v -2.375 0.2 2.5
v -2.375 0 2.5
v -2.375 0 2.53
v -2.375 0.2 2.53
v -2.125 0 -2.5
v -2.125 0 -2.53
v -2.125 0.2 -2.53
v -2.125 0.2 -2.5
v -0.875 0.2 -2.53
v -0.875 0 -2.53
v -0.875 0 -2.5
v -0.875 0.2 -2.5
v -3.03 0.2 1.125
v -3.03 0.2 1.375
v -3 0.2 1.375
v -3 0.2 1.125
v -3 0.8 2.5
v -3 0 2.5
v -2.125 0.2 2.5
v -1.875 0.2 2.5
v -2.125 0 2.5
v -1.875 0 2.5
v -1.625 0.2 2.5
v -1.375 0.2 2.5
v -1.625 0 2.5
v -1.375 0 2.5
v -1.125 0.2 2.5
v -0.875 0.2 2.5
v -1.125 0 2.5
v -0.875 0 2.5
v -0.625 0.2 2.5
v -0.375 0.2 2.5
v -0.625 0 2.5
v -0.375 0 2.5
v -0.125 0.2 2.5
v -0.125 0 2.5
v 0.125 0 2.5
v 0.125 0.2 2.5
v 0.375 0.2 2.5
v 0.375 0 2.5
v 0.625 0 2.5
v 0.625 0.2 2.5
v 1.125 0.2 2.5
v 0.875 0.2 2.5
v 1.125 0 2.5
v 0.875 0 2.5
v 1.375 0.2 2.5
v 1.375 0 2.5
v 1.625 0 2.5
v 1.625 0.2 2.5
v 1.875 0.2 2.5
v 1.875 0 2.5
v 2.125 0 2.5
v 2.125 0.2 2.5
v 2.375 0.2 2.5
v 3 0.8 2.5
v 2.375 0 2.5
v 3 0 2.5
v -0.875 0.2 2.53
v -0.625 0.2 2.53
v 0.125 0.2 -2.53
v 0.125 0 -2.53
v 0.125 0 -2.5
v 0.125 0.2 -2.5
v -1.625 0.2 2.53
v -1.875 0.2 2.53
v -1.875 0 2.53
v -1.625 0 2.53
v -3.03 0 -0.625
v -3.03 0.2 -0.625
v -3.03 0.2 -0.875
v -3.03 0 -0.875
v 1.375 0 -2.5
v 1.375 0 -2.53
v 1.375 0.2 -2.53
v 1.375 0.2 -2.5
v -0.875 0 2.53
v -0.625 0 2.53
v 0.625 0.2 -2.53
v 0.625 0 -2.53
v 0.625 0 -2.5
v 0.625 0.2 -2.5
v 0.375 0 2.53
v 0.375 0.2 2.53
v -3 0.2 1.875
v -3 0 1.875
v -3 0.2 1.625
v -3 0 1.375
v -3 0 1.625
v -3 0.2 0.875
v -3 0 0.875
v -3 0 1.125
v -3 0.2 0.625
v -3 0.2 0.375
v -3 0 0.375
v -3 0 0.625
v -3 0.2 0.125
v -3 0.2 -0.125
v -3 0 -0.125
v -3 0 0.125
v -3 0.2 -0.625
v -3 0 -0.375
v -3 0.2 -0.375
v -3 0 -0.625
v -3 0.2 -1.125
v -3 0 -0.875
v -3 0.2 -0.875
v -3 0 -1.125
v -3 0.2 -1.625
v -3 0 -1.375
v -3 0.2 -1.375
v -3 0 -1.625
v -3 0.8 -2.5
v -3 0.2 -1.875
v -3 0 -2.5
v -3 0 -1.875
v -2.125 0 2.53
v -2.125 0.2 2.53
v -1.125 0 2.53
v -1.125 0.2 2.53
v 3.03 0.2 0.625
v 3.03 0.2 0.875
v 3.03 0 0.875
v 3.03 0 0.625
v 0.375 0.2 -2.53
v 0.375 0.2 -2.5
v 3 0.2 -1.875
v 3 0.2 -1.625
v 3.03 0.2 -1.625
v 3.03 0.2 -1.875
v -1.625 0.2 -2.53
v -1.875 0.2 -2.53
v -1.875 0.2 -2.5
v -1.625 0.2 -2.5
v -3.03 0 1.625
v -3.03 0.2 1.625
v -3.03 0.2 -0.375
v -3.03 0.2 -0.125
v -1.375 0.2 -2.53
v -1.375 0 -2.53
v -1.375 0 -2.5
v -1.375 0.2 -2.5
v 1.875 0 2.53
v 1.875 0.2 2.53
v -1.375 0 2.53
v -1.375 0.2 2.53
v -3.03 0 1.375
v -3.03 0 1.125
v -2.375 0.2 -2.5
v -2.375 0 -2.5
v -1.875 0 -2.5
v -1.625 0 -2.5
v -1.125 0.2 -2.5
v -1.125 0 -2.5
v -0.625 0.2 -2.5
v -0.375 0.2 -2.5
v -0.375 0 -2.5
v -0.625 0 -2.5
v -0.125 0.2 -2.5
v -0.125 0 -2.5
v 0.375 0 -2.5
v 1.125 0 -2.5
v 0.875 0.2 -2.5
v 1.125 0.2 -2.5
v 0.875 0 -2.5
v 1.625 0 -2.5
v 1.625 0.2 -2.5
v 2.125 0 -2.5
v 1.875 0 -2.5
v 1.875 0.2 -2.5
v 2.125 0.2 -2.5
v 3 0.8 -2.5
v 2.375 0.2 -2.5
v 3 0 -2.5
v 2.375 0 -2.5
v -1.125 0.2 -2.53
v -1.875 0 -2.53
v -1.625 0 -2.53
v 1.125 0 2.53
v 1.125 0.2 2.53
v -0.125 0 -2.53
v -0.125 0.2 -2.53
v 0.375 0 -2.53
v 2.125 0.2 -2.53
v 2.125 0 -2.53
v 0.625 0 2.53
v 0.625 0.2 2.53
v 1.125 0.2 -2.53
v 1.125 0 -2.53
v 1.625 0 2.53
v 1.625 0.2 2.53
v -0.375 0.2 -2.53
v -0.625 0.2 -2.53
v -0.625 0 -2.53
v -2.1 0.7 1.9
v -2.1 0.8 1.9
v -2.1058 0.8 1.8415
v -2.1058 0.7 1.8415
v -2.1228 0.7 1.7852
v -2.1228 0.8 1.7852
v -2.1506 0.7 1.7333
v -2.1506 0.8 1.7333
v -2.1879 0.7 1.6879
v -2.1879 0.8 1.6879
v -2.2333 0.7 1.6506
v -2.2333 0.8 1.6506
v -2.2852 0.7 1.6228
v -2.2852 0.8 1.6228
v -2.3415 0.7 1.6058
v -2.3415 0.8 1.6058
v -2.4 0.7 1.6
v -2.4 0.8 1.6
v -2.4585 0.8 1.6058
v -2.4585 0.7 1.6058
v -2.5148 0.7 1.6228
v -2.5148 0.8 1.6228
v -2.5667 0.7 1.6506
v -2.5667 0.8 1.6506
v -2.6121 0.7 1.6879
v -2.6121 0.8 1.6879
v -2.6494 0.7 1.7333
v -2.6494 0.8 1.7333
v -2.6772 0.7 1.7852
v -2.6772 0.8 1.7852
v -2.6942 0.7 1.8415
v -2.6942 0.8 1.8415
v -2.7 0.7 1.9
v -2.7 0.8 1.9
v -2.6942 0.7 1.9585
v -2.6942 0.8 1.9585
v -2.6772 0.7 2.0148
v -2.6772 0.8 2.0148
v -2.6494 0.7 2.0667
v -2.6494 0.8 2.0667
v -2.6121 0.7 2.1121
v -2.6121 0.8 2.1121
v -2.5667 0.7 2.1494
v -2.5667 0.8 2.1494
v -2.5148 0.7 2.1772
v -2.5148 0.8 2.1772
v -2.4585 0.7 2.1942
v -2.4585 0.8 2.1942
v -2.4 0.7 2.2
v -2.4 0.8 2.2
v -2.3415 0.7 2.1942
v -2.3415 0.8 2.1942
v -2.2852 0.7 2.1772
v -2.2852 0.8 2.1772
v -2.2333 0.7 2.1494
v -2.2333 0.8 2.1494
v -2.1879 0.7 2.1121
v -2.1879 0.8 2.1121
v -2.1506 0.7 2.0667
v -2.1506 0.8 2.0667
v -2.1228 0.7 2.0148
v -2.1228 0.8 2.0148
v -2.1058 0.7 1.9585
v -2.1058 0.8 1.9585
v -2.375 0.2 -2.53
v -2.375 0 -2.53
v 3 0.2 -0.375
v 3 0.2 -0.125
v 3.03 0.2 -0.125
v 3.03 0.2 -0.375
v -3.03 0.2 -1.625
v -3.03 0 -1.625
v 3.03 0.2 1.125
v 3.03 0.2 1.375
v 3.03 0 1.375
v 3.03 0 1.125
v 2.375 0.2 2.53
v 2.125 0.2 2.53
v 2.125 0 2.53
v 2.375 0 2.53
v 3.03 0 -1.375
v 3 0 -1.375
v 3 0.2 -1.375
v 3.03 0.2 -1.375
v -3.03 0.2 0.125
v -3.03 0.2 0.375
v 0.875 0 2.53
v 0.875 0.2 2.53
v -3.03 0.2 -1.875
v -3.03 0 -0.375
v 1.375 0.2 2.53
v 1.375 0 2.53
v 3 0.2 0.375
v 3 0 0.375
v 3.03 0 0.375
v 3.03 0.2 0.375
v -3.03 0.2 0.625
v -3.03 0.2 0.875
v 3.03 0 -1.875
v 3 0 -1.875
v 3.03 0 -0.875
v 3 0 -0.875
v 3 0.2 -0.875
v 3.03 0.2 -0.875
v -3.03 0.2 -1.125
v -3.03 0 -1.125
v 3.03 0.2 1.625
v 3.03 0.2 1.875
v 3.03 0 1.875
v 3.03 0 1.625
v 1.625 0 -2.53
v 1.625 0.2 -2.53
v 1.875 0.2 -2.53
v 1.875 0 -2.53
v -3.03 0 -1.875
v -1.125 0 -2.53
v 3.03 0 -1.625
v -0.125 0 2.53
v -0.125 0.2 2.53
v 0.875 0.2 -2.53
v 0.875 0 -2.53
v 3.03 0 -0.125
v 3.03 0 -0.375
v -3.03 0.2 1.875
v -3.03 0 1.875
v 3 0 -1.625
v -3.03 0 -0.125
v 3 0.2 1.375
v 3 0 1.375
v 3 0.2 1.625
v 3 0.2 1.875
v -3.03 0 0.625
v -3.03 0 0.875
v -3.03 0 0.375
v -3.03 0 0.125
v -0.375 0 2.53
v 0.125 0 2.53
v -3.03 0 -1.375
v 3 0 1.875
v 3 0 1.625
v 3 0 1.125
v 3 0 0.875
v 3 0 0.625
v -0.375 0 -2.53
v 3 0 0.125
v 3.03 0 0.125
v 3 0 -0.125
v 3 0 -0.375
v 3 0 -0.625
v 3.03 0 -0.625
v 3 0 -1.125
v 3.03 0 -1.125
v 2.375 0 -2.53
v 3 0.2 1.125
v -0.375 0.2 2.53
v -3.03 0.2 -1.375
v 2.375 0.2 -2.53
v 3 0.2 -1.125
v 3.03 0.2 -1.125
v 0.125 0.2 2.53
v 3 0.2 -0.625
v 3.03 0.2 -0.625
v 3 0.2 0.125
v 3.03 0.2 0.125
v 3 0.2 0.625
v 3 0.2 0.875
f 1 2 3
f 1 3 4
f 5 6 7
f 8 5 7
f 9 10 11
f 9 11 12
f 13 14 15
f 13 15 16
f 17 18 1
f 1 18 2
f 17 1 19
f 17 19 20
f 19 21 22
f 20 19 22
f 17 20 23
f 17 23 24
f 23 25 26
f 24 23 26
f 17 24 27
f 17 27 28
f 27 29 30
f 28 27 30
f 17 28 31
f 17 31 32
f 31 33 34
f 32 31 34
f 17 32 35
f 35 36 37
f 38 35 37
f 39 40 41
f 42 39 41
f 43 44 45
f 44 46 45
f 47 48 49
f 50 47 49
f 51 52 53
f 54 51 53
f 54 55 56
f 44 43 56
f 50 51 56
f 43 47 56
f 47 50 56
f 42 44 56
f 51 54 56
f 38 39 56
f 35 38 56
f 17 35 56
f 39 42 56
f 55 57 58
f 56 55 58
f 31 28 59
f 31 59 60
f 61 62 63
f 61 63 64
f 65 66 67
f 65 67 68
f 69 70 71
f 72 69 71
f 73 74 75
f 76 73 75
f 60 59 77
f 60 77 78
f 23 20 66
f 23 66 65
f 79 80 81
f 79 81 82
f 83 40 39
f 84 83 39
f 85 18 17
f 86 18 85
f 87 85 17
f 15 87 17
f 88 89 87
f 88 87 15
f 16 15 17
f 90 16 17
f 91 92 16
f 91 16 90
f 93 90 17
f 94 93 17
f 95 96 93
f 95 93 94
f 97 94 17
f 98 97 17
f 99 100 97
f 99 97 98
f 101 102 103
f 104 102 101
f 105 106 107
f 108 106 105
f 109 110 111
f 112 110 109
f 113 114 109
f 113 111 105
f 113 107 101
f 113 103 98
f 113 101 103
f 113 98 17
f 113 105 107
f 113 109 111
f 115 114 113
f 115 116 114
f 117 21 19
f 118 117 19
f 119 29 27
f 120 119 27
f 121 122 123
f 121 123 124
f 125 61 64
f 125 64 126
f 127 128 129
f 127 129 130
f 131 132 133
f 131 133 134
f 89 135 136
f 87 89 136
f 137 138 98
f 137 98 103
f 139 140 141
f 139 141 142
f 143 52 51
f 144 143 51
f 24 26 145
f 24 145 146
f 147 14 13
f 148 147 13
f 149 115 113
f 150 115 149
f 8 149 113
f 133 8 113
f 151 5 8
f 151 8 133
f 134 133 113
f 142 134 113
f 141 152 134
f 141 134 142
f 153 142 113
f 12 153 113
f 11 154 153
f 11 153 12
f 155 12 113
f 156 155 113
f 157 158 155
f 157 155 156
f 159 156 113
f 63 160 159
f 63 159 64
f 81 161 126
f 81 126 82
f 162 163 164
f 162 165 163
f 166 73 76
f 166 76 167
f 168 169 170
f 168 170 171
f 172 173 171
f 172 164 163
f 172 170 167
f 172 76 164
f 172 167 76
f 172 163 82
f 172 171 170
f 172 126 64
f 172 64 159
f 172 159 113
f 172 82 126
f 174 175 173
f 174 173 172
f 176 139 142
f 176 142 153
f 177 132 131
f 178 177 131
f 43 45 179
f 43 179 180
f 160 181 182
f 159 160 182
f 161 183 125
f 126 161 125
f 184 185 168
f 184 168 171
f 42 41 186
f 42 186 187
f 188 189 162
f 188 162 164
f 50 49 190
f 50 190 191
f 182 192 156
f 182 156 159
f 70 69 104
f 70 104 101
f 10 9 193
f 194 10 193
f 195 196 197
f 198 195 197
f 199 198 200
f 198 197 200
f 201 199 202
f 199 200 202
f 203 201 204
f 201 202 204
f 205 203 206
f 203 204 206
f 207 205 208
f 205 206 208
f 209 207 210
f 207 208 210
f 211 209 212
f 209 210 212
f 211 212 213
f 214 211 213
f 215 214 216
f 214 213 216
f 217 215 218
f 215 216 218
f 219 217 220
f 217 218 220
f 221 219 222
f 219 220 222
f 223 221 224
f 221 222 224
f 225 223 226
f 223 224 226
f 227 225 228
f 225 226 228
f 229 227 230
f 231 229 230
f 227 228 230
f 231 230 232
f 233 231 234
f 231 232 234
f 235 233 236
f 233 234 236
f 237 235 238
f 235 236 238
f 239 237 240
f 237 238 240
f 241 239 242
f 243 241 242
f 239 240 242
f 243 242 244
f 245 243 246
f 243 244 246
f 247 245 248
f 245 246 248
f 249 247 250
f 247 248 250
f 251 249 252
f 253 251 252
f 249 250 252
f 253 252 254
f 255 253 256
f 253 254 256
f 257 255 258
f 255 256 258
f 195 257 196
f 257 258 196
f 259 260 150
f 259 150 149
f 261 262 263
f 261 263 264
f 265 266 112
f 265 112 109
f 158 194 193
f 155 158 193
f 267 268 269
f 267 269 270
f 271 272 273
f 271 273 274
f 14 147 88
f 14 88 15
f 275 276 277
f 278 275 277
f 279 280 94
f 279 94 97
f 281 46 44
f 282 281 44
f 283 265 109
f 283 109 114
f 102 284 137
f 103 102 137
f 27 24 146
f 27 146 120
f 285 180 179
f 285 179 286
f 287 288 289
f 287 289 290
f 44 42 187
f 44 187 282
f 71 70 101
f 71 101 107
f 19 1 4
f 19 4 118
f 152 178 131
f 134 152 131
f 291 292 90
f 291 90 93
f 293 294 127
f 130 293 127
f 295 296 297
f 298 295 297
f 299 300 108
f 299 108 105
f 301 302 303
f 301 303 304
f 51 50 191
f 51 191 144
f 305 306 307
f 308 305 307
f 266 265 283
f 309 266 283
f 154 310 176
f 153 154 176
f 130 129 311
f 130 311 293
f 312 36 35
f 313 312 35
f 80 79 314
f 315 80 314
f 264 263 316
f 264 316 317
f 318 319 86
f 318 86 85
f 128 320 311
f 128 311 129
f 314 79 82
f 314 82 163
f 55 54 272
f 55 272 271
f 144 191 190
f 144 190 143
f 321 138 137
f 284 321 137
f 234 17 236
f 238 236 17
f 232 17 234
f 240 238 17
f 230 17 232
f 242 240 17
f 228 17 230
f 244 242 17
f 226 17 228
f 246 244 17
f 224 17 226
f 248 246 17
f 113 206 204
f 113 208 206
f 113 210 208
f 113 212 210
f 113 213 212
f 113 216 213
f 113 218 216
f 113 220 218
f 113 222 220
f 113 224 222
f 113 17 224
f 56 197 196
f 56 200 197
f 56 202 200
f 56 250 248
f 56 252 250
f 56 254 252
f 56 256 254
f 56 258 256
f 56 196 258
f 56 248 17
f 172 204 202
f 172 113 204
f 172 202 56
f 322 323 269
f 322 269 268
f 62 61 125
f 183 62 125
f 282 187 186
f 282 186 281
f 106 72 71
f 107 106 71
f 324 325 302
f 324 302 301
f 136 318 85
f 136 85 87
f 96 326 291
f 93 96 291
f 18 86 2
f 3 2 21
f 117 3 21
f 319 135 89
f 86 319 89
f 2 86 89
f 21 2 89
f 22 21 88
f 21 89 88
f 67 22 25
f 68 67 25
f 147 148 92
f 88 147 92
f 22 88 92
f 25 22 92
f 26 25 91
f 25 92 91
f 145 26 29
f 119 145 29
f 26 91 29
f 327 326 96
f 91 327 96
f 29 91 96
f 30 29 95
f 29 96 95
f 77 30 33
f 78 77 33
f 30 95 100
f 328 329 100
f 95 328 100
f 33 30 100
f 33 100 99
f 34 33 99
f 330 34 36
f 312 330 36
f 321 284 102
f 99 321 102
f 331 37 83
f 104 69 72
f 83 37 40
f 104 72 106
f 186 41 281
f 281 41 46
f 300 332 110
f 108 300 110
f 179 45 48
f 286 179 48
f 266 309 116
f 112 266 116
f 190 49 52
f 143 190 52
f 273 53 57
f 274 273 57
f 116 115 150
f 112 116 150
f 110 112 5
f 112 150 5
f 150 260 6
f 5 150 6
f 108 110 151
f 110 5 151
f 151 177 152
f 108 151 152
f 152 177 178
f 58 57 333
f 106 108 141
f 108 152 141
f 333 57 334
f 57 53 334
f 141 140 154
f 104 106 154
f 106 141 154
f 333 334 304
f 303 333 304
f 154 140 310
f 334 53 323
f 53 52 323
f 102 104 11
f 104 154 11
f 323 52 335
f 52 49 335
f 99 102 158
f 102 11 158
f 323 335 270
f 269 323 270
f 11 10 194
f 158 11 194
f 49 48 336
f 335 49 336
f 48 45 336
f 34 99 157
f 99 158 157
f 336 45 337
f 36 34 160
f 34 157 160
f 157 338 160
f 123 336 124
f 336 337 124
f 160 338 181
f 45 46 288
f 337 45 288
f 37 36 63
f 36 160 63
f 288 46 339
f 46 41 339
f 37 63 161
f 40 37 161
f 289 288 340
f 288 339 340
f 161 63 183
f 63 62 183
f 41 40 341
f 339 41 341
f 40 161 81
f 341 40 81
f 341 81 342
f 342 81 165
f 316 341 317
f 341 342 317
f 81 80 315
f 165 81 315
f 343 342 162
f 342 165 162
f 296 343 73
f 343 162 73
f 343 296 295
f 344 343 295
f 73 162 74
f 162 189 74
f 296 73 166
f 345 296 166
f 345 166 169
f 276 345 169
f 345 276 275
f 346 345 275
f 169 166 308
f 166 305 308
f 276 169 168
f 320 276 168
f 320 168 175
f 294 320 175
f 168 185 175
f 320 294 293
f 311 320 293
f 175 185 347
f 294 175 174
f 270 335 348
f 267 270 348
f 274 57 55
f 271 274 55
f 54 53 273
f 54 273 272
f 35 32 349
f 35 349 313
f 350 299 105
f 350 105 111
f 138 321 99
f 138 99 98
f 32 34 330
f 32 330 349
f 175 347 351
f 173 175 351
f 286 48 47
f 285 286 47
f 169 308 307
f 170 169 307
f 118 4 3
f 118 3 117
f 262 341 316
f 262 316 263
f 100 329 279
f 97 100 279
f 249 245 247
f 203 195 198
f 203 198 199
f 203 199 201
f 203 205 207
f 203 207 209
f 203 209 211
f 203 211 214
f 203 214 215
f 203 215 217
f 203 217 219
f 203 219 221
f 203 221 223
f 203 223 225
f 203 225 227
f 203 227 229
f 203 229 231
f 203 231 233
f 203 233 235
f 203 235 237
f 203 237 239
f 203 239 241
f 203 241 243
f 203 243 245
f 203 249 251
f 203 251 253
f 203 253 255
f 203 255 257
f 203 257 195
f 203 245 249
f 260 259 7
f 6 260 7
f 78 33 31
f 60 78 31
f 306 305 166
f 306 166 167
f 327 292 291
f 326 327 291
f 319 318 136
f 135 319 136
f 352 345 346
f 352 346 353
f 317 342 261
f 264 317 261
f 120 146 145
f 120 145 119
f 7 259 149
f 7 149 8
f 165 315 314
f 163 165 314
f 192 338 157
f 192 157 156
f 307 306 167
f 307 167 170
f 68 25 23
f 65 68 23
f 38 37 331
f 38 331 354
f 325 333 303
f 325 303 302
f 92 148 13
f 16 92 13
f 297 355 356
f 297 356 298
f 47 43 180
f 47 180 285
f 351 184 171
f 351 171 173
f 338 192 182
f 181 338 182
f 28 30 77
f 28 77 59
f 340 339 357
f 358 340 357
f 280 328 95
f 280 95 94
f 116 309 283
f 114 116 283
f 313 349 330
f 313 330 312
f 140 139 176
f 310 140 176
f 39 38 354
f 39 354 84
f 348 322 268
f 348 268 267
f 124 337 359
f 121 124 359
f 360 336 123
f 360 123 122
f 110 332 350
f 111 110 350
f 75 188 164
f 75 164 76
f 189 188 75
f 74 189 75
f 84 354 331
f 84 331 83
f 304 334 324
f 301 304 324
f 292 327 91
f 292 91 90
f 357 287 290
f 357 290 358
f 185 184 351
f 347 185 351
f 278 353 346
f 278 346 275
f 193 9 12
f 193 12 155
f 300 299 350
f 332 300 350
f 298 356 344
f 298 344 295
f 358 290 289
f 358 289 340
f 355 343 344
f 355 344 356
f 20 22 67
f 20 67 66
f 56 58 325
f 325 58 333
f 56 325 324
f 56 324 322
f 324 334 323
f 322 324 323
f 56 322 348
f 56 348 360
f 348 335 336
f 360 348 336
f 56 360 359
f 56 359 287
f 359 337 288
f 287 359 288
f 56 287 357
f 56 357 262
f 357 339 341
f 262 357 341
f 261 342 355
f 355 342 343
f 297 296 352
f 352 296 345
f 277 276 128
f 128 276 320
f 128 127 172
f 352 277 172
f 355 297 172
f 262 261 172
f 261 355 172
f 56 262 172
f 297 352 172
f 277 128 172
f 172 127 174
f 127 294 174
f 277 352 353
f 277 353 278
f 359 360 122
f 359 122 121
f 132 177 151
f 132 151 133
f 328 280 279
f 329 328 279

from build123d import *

# Parameters (mm, degrees)
SKETCH1_W           = 6
SKETCH1_H           = 5
BOSS_EXTRUDE1_DEPTH = 0.8
SKETCH2_R           = 0.3
CUT_EXTRUDE1_DEPTH  = 0.1
SKETCH3_W           = 0.25
SKETCH3_H           = 0.2
BOSS_EXTRUDE2_DEPTH = 0.03
LPATTERN1_COUNT     = 2
LPATTERN1_PITCH     = 5.03
SKETCH4_W           = 0.25
SKETCH4_H           = 0.2
BOSS_EXTRUDE3_DEPTH = 0.03
LPATTERN2_COUNT     = 2
LPATTERN2_PITCH     = 6.03


with BuildPart() as part:
    # Sketch1 → Boss-Extrude1 (new body)
    with BuildSketch(Plane(origin=(0, 0, 0), x_dir=(1, 0, 0), z_dir=(0, 1, 0))):
        Rectangle(SKETCH1_W, SKETCH1_H)
    extrude(amount=BOSS_EXTRUDE1_DEPTH)

    # Sketch2 → Cut-Extrude1 (cut)
    with BuildSketch(Plane(origin=(0, 0.8, 0), x_dir=(1, 0, 0), z_dir=(0, 1, 0))):
        with Locations((-2.4, -1.9)):
            Circle(SKETCH2_R)
    extrude(amount=-CUT_EXTRUDE1_DEPTH, mode=Mode.SUBTRACT)

    # Sketch3 → Boss-Extrude2 (add)
    with BuildSketch(Plane.XY.offset(2.5)):
        with Locations((-0.25, 0.1)):
            Rectangle(SKETCH3_W, SKETCH3_H)
        with Locations((0.25, 0.1)):
            Rectangle(SKETCH3_W, SKETCH3_H)
        with Locations((0.75, 0.1)):
            Rectangle(SKETCH3_W, SKETCH3_H)
        with Locations((1.25, 0.1)):
            Rectangle(SKETCH3_W, SKETCH3_H)
        with Locations((1.75, 0.1)):
            Rectangle(SKETCH3_W, SKETCH3_H)
        with Locations((2.25, 0.1)):
            Rectangle(SKETCH3_W, SKETCH3_H)
        with Locations((-0.75, 0.1)):
            Rectangle(SKETCH3_W, SKETCH3_H)
        with Locations((-1.25, 0.1)):
            Rectangle(SKETCH3_W, SKETCH3_H)
        with Locations((-1.75, 0.1)):
            Rectangle(SKETCH3_W, SKETCH3_H)
        with Locations((-2.25, 0.1)):
            Rectangle(SKETCH3_W, SKETCH3_H)
    boss_extrude2 = extrude(amount=BOSS_EXTRUDE2_DEPTH)

    # LPattern1: Boss-Extrude2 ×2
    with Locations(*[(0, 0, -i * LPATTERN1_PITCH) for i in range(1, LPATTERN1_COUNT)]):
        add(boss_extrude2)

    # Sketch4 → Boss-Extrude3 (add)
    with BuildSketch(Plane(origin=(3, 0, 0), x_dir=(0, 0, -1), z_dir=(1, 0, 0))):
        with Locations((-0.25, 0.1)):
            Rectangle(SKETCH4_W, SKETCH4_H)
        with Locations((0.25, 0.1)):
            Rectangle(SKETCH4_W, SKETCH4_H)
        with Locations((0.75, 0.1)):
            Rectangle(SKETCH4_W, SKETCH4_H)
        with Locations((1.25, 0.1)):
            Rectangle(SKETCH4_W, SKETCH4_H)
        with Locations((1.75, 0.1)):
            Rectangle(SKETCH4_W, SKETCH4_H)
        with Locations((-0.75, 0.1)):
            Rectangle(SKETCH4_W, SKETCH4_H)
        with Locations((-1.25, 0.1)):
            Rectangle(SKETCH4_W, SKETCH4_H)
        with Locations((-1.75, 0.1)):
            Rectangle(SKETCH4_W, SKETCH4_H)
    boss_extrude3 = extrude(amount=BOSS_EXTRUDE3_DEPTH)

    # LPattern2: Boss-Extrude3 ×2
    with Locations(*[(-i * LPATTERN2_PITCH, 0, 0) for i in range(1, LPATTERN2_COUNT)]):
        add(boss_extrude3)


solid = part.part
